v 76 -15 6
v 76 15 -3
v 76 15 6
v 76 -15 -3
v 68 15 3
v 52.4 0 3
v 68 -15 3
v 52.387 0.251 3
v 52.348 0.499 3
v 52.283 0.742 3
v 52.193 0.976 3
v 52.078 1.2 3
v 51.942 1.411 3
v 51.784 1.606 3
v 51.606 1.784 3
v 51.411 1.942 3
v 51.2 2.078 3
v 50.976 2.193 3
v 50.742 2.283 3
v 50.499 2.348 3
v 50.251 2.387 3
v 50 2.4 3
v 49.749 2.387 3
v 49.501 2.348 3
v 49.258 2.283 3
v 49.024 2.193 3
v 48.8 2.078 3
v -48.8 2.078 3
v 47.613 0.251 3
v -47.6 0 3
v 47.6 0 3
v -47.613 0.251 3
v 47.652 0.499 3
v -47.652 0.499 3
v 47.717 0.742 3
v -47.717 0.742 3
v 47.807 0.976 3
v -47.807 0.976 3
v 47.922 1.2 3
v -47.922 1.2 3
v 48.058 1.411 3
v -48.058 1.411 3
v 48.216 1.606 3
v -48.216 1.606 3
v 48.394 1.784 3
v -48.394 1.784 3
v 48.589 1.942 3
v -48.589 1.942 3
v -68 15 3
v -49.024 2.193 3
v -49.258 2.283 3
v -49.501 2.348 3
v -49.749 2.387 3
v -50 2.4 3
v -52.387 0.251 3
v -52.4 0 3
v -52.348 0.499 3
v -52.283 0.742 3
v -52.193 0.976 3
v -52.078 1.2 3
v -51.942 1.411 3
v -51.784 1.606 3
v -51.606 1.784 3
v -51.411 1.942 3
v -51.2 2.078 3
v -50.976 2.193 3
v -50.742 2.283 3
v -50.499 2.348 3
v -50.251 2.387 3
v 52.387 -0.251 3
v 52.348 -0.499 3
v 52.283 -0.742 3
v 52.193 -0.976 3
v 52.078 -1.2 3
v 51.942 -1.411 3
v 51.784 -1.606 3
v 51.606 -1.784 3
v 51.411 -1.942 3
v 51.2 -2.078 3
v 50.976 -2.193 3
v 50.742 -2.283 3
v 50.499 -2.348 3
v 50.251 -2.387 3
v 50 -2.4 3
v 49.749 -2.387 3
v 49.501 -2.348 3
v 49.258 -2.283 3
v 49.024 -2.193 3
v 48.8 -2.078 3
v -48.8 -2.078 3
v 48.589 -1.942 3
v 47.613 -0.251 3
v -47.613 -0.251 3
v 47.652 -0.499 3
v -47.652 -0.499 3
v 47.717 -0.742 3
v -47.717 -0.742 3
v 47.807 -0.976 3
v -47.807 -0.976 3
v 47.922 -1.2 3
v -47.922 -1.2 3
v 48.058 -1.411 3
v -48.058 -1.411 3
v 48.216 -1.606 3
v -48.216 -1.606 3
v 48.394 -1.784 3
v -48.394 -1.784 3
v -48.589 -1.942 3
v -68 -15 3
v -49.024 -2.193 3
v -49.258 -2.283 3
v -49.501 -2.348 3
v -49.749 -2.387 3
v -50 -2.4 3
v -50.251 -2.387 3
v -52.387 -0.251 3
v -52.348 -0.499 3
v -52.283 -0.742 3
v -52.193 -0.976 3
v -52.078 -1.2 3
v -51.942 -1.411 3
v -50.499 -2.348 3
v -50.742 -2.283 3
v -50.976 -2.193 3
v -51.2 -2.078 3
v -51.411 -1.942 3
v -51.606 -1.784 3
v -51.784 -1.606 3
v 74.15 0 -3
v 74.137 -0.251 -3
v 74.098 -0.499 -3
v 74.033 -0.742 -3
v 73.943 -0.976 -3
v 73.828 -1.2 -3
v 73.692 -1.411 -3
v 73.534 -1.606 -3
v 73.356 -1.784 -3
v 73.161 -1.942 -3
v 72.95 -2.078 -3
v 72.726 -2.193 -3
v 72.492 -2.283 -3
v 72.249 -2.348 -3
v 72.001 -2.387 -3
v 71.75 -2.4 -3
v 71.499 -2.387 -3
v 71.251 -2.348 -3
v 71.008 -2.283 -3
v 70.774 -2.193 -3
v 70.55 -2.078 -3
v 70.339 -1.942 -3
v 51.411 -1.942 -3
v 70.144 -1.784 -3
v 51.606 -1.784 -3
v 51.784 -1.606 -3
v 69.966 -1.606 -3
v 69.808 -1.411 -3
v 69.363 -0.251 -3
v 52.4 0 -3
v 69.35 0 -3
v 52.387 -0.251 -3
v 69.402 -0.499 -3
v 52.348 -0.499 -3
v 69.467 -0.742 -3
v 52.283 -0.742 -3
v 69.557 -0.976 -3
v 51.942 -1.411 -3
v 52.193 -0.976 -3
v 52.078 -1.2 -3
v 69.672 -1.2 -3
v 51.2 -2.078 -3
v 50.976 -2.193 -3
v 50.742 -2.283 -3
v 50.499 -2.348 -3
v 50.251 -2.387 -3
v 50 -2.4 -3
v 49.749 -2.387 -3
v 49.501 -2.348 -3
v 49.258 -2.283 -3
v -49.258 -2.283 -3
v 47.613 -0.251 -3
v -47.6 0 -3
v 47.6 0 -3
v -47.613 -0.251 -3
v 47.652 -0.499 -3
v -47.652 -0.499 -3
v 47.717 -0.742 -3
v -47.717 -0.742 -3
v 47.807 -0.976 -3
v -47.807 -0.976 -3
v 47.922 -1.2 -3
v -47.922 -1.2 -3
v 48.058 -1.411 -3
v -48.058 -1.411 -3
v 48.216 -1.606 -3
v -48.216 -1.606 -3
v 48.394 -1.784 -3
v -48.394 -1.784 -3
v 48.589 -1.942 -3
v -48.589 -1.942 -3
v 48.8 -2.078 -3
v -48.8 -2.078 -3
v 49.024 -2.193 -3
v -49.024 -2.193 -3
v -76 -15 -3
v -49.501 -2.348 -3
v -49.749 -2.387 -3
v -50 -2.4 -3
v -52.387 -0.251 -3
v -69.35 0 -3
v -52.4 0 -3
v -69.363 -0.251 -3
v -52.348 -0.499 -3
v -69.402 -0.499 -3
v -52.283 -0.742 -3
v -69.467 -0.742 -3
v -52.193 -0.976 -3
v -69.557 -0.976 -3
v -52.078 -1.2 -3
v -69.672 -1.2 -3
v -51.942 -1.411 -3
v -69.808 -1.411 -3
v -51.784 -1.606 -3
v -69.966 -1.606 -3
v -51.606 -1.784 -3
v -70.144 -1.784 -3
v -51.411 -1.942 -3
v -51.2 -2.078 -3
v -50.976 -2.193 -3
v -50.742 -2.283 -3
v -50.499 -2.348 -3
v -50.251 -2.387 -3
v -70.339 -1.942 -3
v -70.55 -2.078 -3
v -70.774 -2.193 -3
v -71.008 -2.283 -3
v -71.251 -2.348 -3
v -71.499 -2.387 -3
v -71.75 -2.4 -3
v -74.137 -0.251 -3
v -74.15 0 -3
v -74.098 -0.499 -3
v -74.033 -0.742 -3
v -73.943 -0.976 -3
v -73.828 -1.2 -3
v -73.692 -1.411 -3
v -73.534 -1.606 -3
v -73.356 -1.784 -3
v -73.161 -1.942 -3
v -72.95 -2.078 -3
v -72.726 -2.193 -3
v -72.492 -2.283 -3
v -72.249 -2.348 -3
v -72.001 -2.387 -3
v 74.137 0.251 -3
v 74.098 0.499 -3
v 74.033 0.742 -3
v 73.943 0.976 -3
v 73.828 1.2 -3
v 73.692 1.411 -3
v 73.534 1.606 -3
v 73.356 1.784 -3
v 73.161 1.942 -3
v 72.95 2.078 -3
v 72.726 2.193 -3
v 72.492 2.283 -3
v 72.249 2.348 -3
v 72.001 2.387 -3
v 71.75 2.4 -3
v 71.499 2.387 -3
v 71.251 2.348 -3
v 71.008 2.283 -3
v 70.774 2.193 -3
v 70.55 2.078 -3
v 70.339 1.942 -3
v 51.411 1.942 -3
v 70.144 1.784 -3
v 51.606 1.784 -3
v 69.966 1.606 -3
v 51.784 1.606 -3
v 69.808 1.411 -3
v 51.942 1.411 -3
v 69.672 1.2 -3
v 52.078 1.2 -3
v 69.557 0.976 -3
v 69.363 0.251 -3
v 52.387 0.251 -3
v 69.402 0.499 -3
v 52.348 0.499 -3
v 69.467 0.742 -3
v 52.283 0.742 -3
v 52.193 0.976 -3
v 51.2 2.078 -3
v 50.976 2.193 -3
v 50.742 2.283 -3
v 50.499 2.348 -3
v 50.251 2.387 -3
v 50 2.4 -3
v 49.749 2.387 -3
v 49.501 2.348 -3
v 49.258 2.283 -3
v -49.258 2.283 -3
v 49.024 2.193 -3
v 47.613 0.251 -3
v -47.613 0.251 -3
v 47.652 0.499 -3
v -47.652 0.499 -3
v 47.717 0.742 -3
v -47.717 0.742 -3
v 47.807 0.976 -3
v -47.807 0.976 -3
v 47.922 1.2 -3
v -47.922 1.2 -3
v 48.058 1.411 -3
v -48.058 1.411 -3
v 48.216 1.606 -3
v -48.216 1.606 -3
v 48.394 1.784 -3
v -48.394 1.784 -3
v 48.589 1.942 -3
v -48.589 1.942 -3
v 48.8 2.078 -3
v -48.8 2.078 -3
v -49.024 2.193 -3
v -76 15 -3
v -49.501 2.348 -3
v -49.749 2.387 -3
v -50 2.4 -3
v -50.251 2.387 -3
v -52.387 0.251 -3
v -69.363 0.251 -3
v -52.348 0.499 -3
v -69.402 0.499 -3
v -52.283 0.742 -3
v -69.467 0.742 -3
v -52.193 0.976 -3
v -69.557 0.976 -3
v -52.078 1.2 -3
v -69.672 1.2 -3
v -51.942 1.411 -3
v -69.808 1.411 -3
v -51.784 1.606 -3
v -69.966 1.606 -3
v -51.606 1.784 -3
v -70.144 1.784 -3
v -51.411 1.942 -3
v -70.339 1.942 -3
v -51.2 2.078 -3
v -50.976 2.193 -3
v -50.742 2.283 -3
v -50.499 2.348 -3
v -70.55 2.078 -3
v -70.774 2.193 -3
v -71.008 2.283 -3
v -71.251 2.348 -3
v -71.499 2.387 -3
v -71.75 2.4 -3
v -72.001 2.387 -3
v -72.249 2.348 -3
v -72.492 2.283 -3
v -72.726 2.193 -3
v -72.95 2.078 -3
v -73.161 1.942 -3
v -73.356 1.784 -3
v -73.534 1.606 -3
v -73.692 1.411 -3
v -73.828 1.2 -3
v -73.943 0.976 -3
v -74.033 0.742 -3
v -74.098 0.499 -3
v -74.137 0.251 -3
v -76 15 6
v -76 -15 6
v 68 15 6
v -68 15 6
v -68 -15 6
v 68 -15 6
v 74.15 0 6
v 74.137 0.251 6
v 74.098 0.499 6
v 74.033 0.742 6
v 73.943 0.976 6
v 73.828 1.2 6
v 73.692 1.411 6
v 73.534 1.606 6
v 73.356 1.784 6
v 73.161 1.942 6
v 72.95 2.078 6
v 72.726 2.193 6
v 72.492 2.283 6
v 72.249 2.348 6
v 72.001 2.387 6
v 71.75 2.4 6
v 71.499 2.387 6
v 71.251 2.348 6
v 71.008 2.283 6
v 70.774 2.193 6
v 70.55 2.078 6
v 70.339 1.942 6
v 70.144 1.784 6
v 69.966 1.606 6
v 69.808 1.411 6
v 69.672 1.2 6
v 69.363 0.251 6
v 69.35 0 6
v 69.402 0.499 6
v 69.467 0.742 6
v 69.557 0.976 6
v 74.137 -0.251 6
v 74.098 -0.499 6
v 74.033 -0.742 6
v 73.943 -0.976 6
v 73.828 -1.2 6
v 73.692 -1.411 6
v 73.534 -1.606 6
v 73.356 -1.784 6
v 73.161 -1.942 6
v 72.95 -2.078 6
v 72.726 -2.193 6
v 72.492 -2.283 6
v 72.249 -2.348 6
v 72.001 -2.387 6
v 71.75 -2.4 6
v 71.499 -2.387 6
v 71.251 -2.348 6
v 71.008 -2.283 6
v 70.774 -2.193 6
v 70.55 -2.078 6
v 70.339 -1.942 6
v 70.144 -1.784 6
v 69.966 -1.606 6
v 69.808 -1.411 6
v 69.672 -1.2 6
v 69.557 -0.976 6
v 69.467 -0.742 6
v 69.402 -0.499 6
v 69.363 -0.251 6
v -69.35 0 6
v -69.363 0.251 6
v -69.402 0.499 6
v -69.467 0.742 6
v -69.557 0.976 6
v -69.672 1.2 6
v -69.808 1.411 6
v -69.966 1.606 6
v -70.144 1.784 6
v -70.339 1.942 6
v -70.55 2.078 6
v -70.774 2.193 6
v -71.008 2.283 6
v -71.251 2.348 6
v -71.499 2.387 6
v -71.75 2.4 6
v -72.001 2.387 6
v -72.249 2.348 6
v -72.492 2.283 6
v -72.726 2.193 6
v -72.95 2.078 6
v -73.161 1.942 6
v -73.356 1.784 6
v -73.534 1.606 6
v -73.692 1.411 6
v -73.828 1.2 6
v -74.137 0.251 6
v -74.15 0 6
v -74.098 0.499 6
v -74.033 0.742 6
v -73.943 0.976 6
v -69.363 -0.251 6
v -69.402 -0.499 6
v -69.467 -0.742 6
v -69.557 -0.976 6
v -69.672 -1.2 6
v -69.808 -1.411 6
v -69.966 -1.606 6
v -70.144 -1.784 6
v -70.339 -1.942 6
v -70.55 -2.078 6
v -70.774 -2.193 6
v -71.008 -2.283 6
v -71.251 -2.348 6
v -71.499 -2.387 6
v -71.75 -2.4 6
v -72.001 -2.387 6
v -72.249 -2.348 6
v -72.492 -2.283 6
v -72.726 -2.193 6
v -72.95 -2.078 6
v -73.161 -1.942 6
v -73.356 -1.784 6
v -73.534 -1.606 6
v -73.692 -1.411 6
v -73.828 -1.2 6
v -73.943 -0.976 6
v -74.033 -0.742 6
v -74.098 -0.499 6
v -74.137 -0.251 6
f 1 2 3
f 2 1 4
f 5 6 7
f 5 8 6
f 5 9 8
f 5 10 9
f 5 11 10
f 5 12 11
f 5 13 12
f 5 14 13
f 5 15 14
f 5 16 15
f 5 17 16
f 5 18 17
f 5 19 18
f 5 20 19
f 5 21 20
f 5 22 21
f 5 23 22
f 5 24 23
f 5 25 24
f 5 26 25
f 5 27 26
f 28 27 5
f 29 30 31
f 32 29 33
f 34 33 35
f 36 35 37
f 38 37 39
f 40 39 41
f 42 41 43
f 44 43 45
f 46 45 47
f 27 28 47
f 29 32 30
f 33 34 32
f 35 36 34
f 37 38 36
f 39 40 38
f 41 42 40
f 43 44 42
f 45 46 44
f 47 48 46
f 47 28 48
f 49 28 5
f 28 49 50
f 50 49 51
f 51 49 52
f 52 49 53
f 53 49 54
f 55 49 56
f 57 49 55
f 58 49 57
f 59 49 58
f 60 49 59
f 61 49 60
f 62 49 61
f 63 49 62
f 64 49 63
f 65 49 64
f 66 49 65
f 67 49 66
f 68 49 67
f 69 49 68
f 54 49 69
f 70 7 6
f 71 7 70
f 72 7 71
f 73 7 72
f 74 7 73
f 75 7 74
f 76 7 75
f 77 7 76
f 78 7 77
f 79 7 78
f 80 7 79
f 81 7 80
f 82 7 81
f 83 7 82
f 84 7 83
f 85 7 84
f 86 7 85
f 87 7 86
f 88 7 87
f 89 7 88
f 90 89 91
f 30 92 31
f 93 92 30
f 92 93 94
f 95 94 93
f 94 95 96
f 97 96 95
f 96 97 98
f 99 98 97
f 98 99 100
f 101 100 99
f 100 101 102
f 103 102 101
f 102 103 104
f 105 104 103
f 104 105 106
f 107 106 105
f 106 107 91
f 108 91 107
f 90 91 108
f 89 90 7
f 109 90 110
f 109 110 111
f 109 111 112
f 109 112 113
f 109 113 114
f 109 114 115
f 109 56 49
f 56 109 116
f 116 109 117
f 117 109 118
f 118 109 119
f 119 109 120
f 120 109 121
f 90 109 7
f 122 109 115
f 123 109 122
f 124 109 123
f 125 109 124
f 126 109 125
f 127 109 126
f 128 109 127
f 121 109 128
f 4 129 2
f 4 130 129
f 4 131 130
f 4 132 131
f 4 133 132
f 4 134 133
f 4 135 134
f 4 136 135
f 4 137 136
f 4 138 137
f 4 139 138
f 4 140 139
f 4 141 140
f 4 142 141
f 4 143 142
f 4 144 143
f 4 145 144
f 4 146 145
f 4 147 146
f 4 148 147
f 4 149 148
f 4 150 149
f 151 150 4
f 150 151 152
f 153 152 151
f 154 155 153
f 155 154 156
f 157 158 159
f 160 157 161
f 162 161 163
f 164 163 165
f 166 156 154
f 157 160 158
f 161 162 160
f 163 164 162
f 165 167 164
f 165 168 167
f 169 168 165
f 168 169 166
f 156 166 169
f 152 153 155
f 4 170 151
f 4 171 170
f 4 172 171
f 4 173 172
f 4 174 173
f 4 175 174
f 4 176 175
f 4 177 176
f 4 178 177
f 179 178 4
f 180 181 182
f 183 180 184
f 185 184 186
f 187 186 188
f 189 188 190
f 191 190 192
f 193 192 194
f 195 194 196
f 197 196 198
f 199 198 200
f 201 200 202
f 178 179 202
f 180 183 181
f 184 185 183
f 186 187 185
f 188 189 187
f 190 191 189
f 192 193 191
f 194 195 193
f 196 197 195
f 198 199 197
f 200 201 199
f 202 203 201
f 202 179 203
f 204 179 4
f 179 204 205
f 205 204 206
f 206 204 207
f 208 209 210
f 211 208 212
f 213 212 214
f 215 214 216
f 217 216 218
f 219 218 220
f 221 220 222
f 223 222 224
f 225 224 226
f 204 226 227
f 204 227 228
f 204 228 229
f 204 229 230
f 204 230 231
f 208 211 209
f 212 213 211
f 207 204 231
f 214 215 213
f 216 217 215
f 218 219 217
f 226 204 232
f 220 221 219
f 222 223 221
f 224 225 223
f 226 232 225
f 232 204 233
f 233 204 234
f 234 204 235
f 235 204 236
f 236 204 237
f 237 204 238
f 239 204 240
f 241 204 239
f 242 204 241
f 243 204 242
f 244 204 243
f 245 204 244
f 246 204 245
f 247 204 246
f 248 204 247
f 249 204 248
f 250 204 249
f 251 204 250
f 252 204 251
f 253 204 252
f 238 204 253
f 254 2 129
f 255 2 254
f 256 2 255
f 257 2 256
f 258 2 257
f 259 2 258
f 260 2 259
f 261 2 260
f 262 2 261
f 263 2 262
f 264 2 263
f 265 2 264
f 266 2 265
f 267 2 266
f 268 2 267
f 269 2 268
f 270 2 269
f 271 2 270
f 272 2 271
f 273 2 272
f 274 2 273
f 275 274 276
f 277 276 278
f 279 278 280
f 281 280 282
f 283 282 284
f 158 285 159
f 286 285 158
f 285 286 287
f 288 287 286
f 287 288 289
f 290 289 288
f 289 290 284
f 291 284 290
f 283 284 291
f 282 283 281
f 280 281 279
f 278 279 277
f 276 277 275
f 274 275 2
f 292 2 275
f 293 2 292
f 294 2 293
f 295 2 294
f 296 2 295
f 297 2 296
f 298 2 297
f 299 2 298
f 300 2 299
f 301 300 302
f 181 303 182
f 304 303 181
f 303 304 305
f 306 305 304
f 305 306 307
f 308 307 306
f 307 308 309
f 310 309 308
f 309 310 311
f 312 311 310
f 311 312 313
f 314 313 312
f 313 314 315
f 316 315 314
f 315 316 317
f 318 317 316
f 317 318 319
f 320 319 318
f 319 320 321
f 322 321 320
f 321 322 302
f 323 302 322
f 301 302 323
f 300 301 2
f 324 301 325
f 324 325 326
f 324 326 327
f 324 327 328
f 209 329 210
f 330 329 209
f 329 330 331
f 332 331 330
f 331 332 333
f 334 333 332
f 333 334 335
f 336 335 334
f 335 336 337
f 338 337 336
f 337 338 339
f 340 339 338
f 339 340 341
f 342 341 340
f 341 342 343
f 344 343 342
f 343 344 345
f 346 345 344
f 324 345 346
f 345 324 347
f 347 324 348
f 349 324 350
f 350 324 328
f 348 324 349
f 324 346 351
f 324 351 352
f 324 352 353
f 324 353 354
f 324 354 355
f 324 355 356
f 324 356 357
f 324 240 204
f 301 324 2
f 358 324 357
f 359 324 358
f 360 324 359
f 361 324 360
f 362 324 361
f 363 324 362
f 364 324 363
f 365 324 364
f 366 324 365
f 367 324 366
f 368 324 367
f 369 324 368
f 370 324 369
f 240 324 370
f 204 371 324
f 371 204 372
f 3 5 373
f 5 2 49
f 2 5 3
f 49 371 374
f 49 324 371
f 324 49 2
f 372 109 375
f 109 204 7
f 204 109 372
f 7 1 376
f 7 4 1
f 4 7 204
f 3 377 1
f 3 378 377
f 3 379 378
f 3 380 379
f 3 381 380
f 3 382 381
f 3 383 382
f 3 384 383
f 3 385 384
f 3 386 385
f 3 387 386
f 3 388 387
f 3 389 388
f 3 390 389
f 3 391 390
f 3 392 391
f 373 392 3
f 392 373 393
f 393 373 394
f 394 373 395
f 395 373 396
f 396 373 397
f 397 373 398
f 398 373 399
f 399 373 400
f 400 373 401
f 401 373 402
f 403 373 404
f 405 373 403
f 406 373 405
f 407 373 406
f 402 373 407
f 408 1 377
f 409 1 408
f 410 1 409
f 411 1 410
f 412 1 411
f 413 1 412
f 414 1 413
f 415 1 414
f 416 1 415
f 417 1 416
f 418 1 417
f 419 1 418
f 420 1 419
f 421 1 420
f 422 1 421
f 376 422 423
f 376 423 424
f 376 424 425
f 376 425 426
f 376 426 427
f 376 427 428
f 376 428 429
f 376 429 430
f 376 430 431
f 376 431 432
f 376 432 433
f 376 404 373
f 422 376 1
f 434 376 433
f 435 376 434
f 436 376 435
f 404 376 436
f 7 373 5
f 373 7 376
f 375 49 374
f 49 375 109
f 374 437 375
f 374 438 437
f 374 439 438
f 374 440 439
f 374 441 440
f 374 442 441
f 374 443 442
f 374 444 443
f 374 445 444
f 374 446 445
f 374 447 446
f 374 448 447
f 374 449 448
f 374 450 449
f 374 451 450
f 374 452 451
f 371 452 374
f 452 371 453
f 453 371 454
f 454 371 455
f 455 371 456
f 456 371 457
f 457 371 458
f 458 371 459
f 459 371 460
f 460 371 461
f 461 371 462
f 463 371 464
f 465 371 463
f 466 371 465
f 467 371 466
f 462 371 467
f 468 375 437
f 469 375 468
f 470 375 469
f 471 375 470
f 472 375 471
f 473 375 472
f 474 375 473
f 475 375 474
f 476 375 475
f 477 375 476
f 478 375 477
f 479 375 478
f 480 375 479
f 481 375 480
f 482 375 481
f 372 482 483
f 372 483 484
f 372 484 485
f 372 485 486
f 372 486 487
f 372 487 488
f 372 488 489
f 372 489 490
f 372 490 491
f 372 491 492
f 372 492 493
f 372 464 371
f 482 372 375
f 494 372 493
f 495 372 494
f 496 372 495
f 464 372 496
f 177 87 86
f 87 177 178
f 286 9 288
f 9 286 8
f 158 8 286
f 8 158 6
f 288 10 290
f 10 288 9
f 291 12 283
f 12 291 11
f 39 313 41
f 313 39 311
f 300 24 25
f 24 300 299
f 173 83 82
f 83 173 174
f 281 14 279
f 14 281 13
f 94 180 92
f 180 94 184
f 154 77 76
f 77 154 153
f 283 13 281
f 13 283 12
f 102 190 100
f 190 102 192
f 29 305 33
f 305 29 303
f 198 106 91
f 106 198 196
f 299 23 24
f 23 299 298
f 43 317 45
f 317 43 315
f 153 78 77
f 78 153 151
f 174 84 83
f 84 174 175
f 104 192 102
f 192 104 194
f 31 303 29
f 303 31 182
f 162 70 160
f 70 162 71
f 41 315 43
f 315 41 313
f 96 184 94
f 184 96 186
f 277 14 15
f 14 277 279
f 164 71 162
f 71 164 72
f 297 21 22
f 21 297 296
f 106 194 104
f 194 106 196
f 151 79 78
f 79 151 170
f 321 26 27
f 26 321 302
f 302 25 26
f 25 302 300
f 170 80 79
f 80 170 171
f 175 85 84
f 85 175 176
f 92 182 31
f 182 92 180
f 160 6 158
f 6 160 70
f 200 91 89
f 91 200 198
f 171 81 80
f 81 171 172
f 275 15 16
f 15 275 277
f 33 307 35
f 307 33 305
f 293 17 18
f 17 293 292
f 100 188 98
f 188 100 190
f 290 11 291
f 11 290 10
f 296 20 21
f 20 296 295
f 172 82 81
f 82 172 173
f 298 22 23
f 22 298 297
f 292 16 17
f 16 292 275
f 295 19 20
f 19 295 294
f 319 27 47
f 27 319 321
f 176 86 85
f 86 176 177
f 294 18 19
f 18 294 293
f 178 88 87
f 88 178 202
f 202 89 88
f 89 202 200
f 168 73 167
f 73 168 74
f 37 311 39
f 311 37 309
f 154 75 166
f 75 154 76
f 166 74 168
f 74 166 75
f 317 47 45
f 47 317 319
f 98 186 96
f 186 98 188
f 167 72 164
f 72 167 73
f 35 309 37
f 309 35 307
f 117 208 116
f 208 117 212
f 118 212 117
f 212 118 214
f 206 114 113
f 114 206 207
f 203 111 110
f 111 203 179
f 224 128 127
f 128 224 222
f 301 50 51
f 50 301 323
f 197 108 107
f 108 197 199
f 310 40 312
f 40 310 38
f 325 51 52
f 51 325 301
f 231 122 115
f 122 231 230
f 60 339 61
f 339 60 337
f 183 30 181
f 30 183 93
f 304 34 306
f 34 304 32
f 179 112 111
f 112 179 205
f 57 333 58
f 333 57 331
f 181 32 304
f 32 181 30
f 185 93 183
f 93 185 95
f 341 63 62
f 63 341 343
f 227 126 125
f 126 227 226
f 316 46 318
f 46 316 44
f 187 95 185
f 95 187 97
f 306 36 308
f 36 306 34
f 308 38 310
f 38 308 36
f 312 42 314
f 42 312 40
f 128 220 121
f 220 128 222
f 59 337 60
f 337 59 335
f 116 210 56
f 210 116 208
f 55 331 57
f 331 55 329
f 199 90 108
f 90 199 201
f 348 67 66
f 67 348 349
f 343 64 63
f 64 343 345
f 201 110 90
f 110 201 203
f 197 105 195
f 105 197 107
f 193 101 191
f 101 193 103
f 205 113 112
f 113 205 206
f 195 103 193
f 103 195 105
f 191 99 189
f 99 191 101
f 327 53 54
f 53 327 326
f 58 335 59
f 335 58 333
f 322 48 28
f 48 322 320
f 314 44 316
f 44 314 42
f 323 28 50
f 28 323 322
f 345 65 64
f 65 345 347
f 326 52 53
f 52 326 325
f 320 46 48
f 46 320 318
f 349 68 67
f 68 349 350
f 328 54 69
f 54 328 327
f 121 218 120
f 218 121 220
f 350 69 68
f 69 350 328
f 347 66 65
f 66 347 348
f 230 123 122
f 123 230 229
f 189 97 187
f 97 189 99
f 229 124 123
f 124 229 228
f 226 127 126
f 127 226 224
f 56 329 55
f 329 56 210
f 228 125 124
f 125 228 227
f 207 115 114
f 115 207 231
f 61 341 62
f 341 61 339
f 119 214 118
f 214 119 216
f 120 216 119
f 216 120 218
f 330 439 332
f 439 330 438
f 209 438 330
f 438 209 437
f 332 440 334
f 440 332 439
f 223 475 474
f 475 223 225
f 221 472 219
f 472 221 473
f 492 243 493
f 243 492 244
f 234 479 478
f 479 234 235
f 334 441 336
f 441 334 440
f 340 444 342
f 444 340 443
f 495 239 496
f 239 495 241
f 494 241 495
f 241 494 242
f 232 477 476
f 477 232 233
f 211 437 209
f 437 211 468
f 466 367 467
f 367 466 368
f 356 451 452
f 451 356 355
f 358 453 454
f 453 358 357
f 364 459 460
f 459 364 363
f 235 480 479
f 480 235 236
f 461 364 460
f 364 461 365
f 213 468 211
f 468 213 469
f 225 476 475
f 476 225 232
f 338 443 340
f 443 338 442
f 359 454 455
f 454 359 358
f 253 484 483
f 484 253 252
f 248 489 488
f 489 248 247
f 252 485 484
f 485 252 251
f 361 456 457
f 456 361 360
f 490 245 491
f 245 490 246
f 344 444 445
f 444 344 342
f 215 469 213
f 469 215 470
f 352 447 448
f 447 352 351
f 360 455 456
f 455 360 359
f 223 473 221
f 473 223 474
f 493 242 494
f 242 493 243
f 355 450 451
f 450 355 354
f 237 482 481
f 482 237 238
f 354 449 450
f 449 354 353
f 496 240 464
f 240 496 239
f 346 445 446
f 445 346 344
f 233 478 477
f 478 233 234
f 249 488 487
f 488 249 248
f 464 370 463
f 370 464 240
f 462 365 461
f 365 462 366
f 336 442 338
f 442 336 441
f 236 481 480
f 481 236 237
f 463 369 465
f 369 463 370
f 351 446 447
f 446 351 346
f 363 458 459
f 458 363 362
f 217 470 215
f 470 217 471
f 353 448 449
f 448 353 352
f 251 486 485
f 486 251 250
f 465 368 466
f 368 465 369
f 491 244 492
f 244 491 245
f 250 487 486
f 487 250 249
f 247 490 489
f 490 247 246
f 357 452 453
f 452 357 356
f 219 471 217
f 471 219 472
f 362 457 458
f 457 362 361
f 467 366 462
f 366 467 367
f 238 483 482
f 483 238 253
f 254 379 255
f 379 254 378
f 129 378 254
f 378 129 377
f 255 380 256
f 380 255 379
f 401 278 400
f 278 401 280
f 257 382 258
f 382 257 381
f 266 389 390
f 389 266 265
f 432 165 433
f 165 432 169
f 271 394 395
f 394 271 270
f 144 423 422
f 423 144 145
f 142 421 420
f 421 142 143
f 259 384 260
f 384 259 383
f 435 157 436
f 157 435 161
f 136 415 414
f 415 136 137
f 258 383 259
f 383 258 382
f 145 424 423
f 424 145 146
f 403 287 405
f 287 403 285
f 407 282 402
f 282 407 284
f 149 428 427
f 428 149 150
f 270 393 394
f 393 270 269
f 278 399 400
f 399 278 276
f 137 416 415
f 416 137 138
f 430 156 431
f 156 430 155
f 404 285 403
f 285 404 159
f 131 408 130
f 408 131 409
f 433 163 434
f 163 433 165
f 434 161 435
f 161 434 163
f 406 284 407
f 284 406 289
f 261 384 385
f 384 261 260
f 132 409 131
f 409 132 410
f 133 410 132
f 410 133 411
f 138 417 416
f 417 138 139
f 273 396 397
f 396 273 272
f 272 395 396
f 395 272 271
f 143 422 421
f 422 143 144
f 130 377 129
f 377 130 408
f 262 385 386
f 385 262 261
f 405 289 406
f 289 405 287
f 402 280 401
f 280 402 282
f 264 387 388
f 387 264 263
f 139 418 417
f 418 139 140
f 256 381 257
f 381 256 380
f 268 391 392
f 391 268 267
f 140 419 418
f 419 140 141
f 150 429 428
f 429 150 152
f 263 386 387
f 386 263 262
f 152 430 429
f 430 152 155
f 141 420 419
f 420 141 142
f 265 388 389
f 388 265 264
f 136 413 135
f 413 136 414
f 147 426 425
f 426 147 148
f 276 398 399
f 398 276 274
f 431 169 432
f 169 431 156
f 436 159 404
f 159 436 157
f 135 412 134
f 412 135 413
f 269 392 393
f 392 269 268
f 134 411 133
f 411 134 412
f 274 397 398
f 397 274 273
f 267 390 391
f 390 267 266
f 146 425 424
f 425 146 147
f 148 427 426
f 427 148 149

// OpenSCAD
// file: nutsnbolts/data-access.scad
// Norm Nuts and Bolts - a OpenSCAD library
// Copyright (C) 2012  Johannes Kneer

// This program is free software: you can redistribute it and/or modify
// it under the terms of the GNU General Public License as published by
// the Free Software Foundation, either version 3 of the License, or
// (at your option) any later version.

// This program is distributed in the hope that it will be useful,
// but WITHOUT ANY WARRANTY; without even the implied warranty of
// MERCHANTABILITY or FITNESS FOR A PARTICULAR PURPOSE.  See the
// GNU General Public License for more details.

// You should have received a copy of the GNU General Public License
// along with this program.  If not, see <http://www.gnu.org/licenses/>.


// DATABASE ACCESS FUNCTIONS AND CONSTANTS



// == CONSTANTS ==

// screw table access keys
_NB_S_DESC            = 0;
_NB_S_FAMKEY			    = 1;
_NB_S_LENGTH          = 2;
_NB_S_NOTHREAD_LENGTH = 3;

_NB_F_DESC			      = 0;
_NB_F_OUTER_DIA       = 1;
_NB_F_INNER_DIA       = 2;
_NB_F_LEAD            = 3;
_NB_F_KEY             = 4;
_NB_F_KEY_DEPTH       = 5;
_NB_F_HEAD_HEIGHT     = 6;
_NB_F_HEAD_DIA        = 7;
_NB_F_NUT_KEY         = 8;
_NB_F_NUT_HEIGHT      = 9;
_NB_F_PITCH_FINE      = 10;
_NB_F_PITCH_MEDIUM    = 11;
_NB_F_PITCH_COARSE    = 12;


// == FUNCTIONS ==

// _get_screw("descriptor")   with descriptor = M8x25
//   find the line for a general object in the data matrix

function _get_screw(n) = data_screw[search([n], data_screw)[0]];
function _get_screw_fam(n) = data_screw_fam[search([_get_screw(n)[_NB_S_FAMKEY]], data_screw_fam)[0]];

function _get_fam(n) = data_screw_fam[search([n], data_screw_fam)[0]];


// _get_XXXXX("descriptor") functions
// find a single property in the database

function _get_desc(n)        = _get_screw(n)[_NB_S_DESC];
function _get_famkey(n)         = _get_screw(n)[_NB_S_FAMKEY];
function _get_length(n)      = _get_screw(n)[_NB_S_LENGTH];
function _get_nt_length(n)   = _get_screw(n)[_NB_S_NOTHREAD_LENGTH];

function _get_outer_dia(n)   = _get_screw_fam(n)[_NB_F_OUTER_DIA];
function _get_inner_dia(n)   = _get_screw_fam(n)[_NB_F_INNER_DIA];
function _get_lead(n)        = _get_screw_fam(n)[_NB_F_LEAD];
function _get_head_height(n) = _get_screw_fam(n)[_NB_F_HEAD_HEIGHT];
function _get_head_dia(n)    = _get_screw_fam(n)[_NB_F_HEAD_DIA];
function _get_nut_key(n)     = _get_screw_fam(n)[_NB_F_NUT_KEY];
function _get_nut_height(n)  = _get_screw_fam(n)[_NB_F_NUT_HEIGHT];
function _get_fine_pitch(n)  = _get_screw_fam(n)[_NB_F_PITCH_FINE];
function _get_medium_pitch(n)  = _get_screw_fam(n)[_NB_F_PITCH_MEDIUM];
function _get_coarse_pitch(n)  = _get_screw_fam(n)[_NB_F_PITCH_COARSE];
// file: nutsnbolts/materials.scad
// Norm Nuts and Bolts - a OpenSCAD library
// Copyright (C) 2012  Johannes Kneer

// This program is free software: you can redistribute it and/or modify
// it under the terms of the GNU General Public License as published by
// the Free Software Foundation, either version 3 of the License, or
// (at your option) any later version.

// This program is distributed in the hope that it will be useful,
// but WITHOUT ANY WARRANTY; without even the implied warranty of
// MERCHANTABILITY or FITNESS FOR A PARTICULAR PURPOSE.  See the
// GNU General Public License for more details.

// You should have received a copy of the GNU General Public License
// along with this program.  If not, see <http://www.gnu.org/licenses/>.


// MATERIALS

// all materials take a no-parameter that should be used to document
// the exact material in code, the number is not yet used in the code 



module stainless(no="1.4301") {
	color([0.45, 0.43, 0.5]) children([0:$children-1]);
}

module steel(no) {
	color([0.65, 0.67, 0.72]) children([0:$children-1]);
}

module iron(no="ST37") {
	color([0.36, 0.33, 0.33]) children([0:$children-1]);
}

// additional colors
CL_ZINC = [0.4, 0.4, 0.4];
// main file
// original panels
//farHole = 65;
//closeHole=19.5;
//bracketWidth=30;
//bracketHeight=75;

// 16 newer panels
farHole = 14.25;
closeHole = 70.25;
bracketWidth=30;
bracketHeight=80;


terminalHoleWidth=53;
bracketThickness=6;

screwDiameter = 4.8;
screwRadius=screwDiameter/2;


module center_bracket() {

difference(){
    
    union(){
    cube([bracketWidth,bracketHeight,bracketThickness],center=true);
    rotate(90)cube([bracketWidth,bracketHeight,bracketThickness],center=true);
    }
    union() {
               color("green") translate([closeHole/2,farHole/2,0]) cylinder(r=screwRadius,h=20,center=true);
               color("green") translate([-closeHole/2,farHole/2,0]) cylinder(r=screwRadius,h=20,center=true);
               color("green") translate([closeHole/2,-farHole/2,0]) cylinder(r=screwRadius,h=20,center=true);
               color("green") translate([-closeHole/2,-farHole/2,0]) cylinder(r=screwRadius,h=20,center=true);
               color("green") translate([farHole/2,closeHole/2,0]) cylinder(r=screwRadius,h=20,center=true);
               color("green") translate([-farHole/2,closeHole/2,0]) cylinder(r=screwRadius,h=20,center=true);
               color("green") translate([farHole/2,-closeHole/2,0]) cylinder(r=screwRadius,h=20,center=true);
               color("green") translate([-farHole/2,-closeHole/2,0]) cylinder(r=screwRadius,h=20,center=true);


    }
}
}

module half_bracket() {
    halfBracketThickness=bracketThickness;
    difference(){
        union(){
    translate([0,bracketHeight/4,0]) cube([bracketWidth,bracketHeight/2,halfBracketThickness],center=true);
    rotate(90) translate([bracketWidth/4,0,0])cube([bracketWidth/2,bracketHeight,halfBracketThickness],center=true);
        }
        translate([0,-2,0]) union(){
               color("green") translate([closeHole/2,farHole/2,0]) cylinder(r=screwRadius,h=20,center=true);
               color("green") translate([-closeHole/2,farHole/2,0]) cylinder(r=screwRadius,h=20,center=true);
               color("green") translate([farHole/2,closeHole/2,0]) cylinder(r=screwRadius,h=20,center=true);
               color("green") translate([-farHole/2,closeHole/2,0]) cylinder(r=screwRadius,h=20,center=true);
        }
    }

}

// https://www.thingiverse.com/thing:2550079
// https://www.amazon.com/gp/product/B010UDG6NG/ref=oh_aui_detailpage_o05_s00?ie=UTF8&psc=1&tag=tv-auto-20
include <nutsnbolts/cyl_head_bolt.scad>;
include <nutsnbolts/materials.scad>;
$fn=60;
module terminal_holder(){
    difference(){
    
    union(){
    cube([bracketHeight,bracketHeight,bracketThickness],center=true);
    }
    union() {
               color("green") translate([closeHole/2,farHole/2,0]) cylinder(r=screwRadius,h=20,center=true);
               color("green") translate([-closeHole/2,farHole/2,0]) cylinder(r=screwRadius,h=20,center=true);
               color("green") translate([closeHole/2,-farHole/2,0]) cylinder(r=screwRadius,h=20,center=true);
               color("green") translate([-closeHole/2,-farHole/2,0]) cylinder(r=screwRadius,h=20,center=true);
               color("green") translate([farHole/2,closeHole/2,0]) cylinder(r=screwRadius,h=20,center=true);
               color("green") translate([-farHole/2,closeHole/2,0]) cylinder(r=screwRadius,h=20,center=true);
               color("green") translate([farHole/2,-closeHole/2,0]) cylinder(r=screwRadius,h=20,center=true);
               color("green") translate([-farHole/2,-closeHole/2,0]) cylinder(r=screwRadius,h=20,center=true);
        rotate(45) {
            translate([-bracketHeight/4-8,0,0]) {
        rotate([180,0,0]) nutcatch_parallel("M3", l=5);
        translate([0, 0, 50]) hole_through(name="M3", l=50+5, cl=0.1, h=10, hcl=0.4);
	    translate([terminalHoleWidth,0,0]) rotate([180,0,0]) nutcatch_parallel("M3", l=5);
	    translate([terminalHoleWidth,0,0]) translate([0, 0, 50]) hole_through(name="M3", l=50+5, cl=0.1, h=10, hcl=0.4);
            }
        }
    }
}

}


module terminal_holder2(){
    difference(){
    
    union(){
            center_bracket();
            color("red") translate([-20,-20,0])cube([10,10,bracketThickness],center=true);
            color("red") translate([20,20,0])cube([10,10,bracketThickness],center=true);
        }
    union() {
               color("green") translate([closeHole/2,farHole/2,0]) cylinder(r=screwRadius,h=20,center=true);
               color("green") translate([-closeHole/2,farHole/2,0]) cylinder(r=screwRadius,h=20,center=true);
               color("green") translate([closeHole/2,-farHole/2,0]) cylinder(r=screwRadius,h=20,center=true);
               color("green") translate([-closeHole/2,-farHole/2,0]) cylinder(r=screwRadius,h=20,center=true);
               color("green") translate([farHole/2,closeHole/2,0]) cylinder(r=screwRadius,h=20,center=true);
               color("green") translate([-farHole/2,closeHole/2,0]) cylinder(r=screwRadius,h=20,center=true);
               color("green") translate([farHole/2,-closeHole/2,0]) cylinder(r=screwRadius,h=20,center=true);
               color("green") translate([-farHole/2,-closeHole/2,0]) cylinder(r=screwRadius,h=20,center=true);
        rotate(45) {
            translate([-bracketHeight/4-8,0,0]) {
        rotate([180,0,0]) nutcatch_parallel("M3", l=5);
        translate([0, 0, 50]) hole_through(name="M3", l=50+5, cl=0.1, h=10, hcl=0.4);
	    translate([terminalHoleWidth,0,0]) rotate([180,0,0]) nutcatch_parallel("M3", l=5);
	    translate([terminalHoleWidth,0,0]) translate([0, 0, 50]) hole_through(name="M3", l=50+5, cl=0.1, h=10, hcl=0.4);
            }
        }
    }
}

}


/*
http://codeviewer.org/view/code:1b36 
Copyright (C) 2011 Sergio Vilches
This program is free software: you can redistribute it and/or modify it under the terms of the GNU General Public License as published by the Free Software Foundation, either version 3 of the License, or (at your option) any later version.
This program is distributed in the hope that it will be useful, but WITHOUT ANY WARRANTY; without even the implied warranty of MERCHANTABILITY or FITNESS FOR A PARTICULAR PURPOSE. See the GNU General Public License for more details. You should have received a copy of the GNU General Public License along with this program. If not, see <http://www.gnu.org/licenses/>.
Contact: s.vilches.e@gmail.com


    ----------------------------------------------------------- 
                 Round Corners Cube (Extruded)                
      roundCornersCube(x,y,z,r) Where:                        
         - x = Xdir width                                     
         - y = Ydir width                                     
         - z = Height of the cube                             
         - r = Rounding radious                               
                                                              
      Example: roundCornerCube(10,10,2,1);                    
     *Some times it's needed to use F6 to see good results!   
 	 ----------------------------------------------------------- 
*/
// Test it!
// roundCornersCube(10,5,2,1);


module createMeniscus(h,radius) // This module creates the shape that needs to be substracted from a cube to make its corners rounded.
difference(){        //This shape is basicly the difference between a quarter of cylinder and a cube
   translate([radius/2+0.1,radius/2+0.1,0]){
      cube([radius+0.2,radius+0.1,h+0.2],center=true);         // All that 0.x numbers are to avoid "ghost boundaries" when substracting
   }

   cylinder(h=h+0.2,r=radius,$fn = 25,center=true);
}


module roundCornersCube(x,y,z,r)  // Now we just substract the shape we have created in the four corners
difference(){
   cube([x,y,z], center=true);

translate([x/2-r,y/2-r]){  // We move to the first corner (x,y)
      rotate(0){  
         createMeniscus(z,r); // And substract the meniscus
      }
   }
   translate([-x/2+r,y/2-r]){ // To the second corner (-x,y)
      rotate(90){
         createMeniscus(z,r); // But this time we have to rotate the meniscus 90 deg
      }
   }
      translate([-x/2+r,-y/2+r]){ // ... 
      rotate(180){
         createMeniscus(z,r);
      }
   }
      translate([x/2-r,-y/2+r]){
      rotate(270){
         createMeniscus(z,r);
      }
   }
}



module hanging_bracket(){
    difference(){
        union(){
            half_bracket();
            // x y z r
            translate([0,-3,0])roundCornersCube(bracketWidth,bracketWidth,bracketThickness,2);
        }
        color("green") translate([0,-8,0]) cylinder(r=screwRadius*1.5,h=20,center=true);
    }
}


module power_supply_bracket(){
    powerHoleDistanceShort=100;
    powerHoldDistanceLong=143.5;
    powerBracketWidth=152;
    difference(){
        union(){    
            cube([powerBracketWidth,bracketWidth,bracketThickness],center=true);
            translate([powerBracketWidth/2-4,0,bracketThickness-2])cube([8,bracketWidth,4],center=true);
            translate([-powerBracketWidth/2+4,0,bracketThickness-2])cube([8,bracketWidth,4],center=true);
        }
        union(){
        color("red") translate([powerHoleDistanceShort/2,0,0]) cylinder(r=screwRadius,h=50,center=true);
        color("red") translate([-powerHoleDistanceShort/2,0,0]) cylinder(r=screwRadius,h=50,center=true);
        color("red") translate([-powerHoldDistanceLong/2,0,0]) cylinder(r=screwRadius,h=50,center=true);
        color("red") translate([powerHoldDistanceLong/2,0,0]) cylinder(r=screwRadius,h=50,center=true);
        }
    }
    
}

// == example nut catches and holes ==

//difference() {
//	translate([-15, -15, 0]) cube([80, 30, 50]);
//	rotate([180,0,0]) nutcatch_parallel("M3", l=5);
//	translate([0, 0, 50]) hole_through(name="M5", l=50+5, cl=0.1, h=10, hcl=0.4);

	//translate([0, 0, 50]) hole_through(name="M5", l=50+5, cl=0.1, h=10, hcl=0.4);
	//translate([55, 0, 9]) nutcatch_sidecut("M8", l=100, clk=0.1, clh=0.1, clsl=0.1);
	//translate([55, 0, 50]) hole_through(name="M8", l=50+5, cl=0.1, h=10, hcl=0.4);
	//translate([27.5, 0, 50]) hole_threaded(name="M5", l=60);
//}


power_supply_bracket();
//hanging_bracket();
//half_bracket();
//translate([100,0,0])center_bracket();
//translate([-100,0,0])terminal_holder2();
